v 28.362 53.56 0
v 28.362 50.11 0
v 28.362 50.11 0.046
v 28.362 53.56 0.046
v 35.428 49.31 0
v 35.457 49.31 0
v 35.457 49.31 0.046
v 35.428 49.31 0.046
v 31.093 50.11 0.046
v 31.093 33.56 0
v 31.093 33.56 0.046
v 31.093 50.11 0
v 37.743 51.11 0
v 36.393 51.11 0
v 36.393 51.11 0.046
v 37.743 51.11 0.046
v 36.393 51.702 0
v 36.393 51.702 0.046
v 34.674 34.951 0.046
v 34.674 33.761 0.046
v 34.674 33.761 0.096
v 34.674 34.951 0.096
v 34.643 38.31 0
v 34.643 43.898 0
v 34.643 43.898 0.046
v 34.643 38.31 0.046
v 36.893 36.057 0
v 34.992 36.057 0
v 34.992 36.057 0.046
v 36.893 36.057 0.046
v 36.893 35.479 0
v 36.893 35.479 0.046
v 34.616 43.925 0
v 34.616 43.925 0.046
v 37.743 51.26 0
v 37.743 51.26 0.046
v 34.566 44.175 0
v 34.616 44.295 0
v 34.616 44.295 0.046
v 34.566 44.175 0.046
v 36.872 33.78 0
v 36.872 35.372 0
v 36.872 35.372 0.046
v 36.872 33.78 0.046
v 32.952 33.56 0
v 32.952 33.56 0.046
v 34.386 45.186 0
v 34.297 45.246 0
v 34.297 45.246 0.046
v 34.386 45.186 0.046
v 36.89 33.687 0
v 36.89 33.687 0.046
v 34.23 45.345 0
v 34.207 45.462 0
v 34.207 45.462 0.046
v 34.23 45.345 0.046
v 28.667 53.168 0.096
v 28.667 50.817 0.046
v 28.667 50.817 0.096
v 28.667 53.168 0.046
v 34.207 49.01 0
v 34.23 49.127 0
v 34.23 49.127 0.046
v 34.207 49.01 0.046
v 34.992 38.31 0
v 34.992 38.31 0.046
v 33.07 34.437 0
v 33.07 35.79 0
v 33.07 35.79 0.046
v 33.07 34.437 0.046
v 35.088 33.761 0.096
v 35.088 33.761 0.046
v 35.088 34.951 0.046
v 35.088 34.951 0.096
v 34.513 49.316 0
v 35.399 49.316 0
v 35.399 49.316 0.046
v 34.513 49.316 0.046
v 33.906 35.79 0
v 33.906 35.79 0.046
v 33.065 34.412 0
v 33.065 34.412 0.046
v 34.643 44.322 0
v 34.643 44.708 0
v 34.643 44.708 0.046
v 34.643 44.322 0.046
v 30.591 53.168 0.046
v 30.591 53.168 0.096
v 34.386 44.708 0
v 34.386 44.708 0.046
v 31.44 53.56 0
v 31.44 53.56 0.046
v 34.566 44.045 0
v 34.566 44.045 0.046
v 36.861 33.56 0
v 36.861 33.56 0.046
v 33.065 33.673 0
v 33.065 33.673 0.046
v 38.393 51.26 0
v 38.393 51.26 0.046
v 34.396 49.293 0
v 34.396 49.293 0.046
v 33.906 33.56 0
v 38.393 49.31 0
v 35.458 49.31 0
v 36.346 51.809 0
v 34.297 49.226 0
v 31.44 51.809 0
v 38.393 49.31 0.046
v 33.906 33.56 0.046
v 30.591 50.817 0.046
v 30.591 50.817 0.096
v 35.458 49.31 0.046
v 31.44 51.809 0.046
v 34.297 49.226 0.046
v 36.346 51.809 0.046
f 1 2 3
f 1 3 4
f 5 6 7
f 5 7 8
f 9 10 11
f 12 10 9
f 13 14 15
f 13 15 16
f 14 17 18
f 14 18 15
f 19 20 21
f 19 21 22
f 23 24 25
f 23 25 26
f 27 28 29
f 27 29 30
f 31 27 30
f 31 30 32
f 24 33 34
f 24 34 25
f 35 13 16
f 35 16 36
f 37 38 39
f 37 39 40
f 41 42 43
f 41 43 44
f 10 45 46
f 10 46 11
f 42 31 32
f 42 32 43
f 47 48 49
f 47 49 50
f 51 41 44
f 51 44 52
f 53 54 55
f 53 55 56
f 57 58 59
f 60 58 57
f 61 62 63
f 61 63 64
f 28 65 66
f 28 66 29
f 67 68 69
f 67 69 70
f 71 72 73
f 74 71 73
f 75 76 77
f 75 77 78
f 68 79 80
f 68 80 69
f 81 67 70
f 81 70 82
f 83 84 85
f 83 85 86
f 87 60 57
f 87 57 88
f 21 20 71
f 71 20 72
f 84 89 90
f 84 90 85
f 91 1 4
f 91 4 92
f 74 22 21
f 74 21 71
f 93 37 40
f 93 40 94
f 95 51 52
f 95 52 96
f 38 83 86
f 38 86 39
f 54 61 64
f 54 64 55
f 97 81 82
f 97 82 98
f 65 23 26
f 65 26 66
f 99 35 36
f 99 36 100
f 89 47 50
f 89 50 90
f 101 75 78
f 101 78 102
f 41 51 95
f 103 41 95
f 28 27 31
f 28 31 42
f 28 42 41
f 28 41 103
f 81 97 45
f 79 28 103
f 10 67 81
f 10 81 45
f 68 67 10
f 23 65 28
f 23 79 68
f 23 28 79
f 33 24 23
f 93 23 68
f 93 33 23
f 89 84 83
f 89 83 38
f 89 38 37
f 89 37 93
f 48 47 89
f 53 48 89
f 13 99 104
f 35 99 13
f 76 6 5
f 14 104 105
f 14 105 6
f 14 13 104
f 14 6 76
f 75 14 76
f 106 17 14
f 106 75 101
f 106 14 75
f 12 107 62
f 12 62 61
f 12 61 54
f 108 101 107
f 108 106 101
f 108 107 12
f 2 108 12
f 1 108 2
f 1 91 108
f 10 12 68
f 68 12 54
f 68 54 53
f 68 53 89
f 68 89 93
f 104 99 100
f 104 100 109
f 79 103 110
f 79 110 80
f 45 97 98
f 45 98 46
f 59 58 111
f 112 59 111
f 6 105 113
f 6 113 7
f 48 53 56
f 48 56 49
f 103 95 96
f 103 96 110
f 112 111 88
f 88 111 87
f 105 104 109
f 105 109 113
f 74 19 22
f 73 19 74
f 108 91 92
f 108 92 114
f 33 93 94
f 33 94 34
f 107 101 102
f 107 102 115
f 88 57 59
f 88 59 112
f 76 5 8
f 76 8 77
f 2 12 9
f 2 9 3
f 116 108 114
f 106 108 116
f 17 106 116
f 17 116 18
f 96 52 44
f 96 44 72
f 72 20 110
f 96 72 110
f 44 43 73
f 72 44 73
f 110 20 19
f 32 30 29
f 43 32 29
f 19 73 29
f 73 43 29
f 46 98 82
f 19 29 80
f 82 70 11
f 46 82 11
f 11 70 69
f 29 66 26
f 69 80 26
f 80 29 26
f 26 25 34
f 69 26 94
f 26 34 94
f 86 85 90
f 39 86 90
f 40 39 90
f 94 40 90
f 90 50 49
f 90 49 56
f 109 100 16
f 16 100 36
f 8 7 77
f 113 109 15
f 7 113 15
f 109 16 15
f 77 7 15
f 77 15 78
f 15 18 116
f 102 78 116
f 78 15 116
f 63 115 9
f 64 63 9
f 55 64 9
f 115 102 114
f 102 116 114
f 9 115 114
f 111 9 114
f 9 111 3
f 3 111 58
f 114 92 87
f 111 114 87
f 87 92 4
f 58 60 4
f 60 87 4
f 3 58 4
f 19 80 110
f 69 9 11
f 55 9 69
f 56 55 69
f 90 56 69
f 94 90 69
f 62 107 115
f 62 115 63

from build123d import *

# Parameters (mm, degrees)
PAD_DEPTH    = 0.046
SKETCH002_W  = 1.924742
SKETCH002_H  = 2.351108
PAD001_DEPTH = 0.05
SKETCH003_W  = 0.414509
SKETCH003_H  = 1.190033
PAD002_DEPTH = 0.05


with BuildPart() as part:
    # Sketch → Pad (new body)
    with BuildSketch(Plane.XY):
        Polygon((36.346094, 51.80915), (36.392998, 51.701576), (36.392998, 51.109999), (37.742998, 51.109999), (37.742998, 51.259997), (38.392999, 51.259997), (38.392999, 49.31), (35.458194, 49.31), (35.4573, 49.310176), (35.427625, 49.310087), (35.398525, 49.315875), (34.512999, 49.315875), (34.395946, 49.292591), (34.296711, 49.226287), (34.230407, 49.127052), (34.207122, 49.009999), (34.207122, 45.461999), (34.230407, 45.344946), (34.296711, 45.245711), (34.386002, 45.186051), (34.386002, 44.708), (34.642999, 44.708), (34.642999, 44.322444), (34.615783, 44.295228), (34.565999, 44.175042), (34.565999, 44.044954), (34.615783, 43.924769), (34.642999, 43.897553), (34.642999, 38.31), (34.992186, 38.31), (34.992186, 36.056903), (36.893, 36.056903), (36.893, 35.478903), (36.871742, 35.372032), (36.871742, 33.780103), (36.890262, 33.687001), (36.860833, 33.559999), (33.906066, 33.559999), (33.906066, 35.790099), (33.069934, 35.790099), (33.069934, 34.437018), (33.064958, 34.412001), (33.064958, 33.673212), (32.951745, 33.559999), (31.092999, 33.559999), (31.092999, 50.109999), (28.362245, 50.109999), (28.362245, 53.56), (31.439899, 53.56), (31.439899, 51.809147), align=None)
    extrude(amount=PAD_DEPTH)

    # Sketch002 (on Face52 of Pad) → Pad001 (join)
    with BuildSketch(Plane.XY.offset(0.046)):
        with Locations((29.62901, 51.992506)):
            Rectangle(SKETCH002_W, SKETCH002_H)
    extrude(amount=PAD001_DEPTH)

    # Sketch003 (on Face5 of Pad001) → Pad002 (join)
    with BuildSketch(Plane.XY.offset(0.046)):
        with Locations((34.881022, 34.35564)):
            Rectangle(SKETCH003_W, SKETCH003_H)
    extrude(amount=PAD002_DEPTH)


solid = part.part
